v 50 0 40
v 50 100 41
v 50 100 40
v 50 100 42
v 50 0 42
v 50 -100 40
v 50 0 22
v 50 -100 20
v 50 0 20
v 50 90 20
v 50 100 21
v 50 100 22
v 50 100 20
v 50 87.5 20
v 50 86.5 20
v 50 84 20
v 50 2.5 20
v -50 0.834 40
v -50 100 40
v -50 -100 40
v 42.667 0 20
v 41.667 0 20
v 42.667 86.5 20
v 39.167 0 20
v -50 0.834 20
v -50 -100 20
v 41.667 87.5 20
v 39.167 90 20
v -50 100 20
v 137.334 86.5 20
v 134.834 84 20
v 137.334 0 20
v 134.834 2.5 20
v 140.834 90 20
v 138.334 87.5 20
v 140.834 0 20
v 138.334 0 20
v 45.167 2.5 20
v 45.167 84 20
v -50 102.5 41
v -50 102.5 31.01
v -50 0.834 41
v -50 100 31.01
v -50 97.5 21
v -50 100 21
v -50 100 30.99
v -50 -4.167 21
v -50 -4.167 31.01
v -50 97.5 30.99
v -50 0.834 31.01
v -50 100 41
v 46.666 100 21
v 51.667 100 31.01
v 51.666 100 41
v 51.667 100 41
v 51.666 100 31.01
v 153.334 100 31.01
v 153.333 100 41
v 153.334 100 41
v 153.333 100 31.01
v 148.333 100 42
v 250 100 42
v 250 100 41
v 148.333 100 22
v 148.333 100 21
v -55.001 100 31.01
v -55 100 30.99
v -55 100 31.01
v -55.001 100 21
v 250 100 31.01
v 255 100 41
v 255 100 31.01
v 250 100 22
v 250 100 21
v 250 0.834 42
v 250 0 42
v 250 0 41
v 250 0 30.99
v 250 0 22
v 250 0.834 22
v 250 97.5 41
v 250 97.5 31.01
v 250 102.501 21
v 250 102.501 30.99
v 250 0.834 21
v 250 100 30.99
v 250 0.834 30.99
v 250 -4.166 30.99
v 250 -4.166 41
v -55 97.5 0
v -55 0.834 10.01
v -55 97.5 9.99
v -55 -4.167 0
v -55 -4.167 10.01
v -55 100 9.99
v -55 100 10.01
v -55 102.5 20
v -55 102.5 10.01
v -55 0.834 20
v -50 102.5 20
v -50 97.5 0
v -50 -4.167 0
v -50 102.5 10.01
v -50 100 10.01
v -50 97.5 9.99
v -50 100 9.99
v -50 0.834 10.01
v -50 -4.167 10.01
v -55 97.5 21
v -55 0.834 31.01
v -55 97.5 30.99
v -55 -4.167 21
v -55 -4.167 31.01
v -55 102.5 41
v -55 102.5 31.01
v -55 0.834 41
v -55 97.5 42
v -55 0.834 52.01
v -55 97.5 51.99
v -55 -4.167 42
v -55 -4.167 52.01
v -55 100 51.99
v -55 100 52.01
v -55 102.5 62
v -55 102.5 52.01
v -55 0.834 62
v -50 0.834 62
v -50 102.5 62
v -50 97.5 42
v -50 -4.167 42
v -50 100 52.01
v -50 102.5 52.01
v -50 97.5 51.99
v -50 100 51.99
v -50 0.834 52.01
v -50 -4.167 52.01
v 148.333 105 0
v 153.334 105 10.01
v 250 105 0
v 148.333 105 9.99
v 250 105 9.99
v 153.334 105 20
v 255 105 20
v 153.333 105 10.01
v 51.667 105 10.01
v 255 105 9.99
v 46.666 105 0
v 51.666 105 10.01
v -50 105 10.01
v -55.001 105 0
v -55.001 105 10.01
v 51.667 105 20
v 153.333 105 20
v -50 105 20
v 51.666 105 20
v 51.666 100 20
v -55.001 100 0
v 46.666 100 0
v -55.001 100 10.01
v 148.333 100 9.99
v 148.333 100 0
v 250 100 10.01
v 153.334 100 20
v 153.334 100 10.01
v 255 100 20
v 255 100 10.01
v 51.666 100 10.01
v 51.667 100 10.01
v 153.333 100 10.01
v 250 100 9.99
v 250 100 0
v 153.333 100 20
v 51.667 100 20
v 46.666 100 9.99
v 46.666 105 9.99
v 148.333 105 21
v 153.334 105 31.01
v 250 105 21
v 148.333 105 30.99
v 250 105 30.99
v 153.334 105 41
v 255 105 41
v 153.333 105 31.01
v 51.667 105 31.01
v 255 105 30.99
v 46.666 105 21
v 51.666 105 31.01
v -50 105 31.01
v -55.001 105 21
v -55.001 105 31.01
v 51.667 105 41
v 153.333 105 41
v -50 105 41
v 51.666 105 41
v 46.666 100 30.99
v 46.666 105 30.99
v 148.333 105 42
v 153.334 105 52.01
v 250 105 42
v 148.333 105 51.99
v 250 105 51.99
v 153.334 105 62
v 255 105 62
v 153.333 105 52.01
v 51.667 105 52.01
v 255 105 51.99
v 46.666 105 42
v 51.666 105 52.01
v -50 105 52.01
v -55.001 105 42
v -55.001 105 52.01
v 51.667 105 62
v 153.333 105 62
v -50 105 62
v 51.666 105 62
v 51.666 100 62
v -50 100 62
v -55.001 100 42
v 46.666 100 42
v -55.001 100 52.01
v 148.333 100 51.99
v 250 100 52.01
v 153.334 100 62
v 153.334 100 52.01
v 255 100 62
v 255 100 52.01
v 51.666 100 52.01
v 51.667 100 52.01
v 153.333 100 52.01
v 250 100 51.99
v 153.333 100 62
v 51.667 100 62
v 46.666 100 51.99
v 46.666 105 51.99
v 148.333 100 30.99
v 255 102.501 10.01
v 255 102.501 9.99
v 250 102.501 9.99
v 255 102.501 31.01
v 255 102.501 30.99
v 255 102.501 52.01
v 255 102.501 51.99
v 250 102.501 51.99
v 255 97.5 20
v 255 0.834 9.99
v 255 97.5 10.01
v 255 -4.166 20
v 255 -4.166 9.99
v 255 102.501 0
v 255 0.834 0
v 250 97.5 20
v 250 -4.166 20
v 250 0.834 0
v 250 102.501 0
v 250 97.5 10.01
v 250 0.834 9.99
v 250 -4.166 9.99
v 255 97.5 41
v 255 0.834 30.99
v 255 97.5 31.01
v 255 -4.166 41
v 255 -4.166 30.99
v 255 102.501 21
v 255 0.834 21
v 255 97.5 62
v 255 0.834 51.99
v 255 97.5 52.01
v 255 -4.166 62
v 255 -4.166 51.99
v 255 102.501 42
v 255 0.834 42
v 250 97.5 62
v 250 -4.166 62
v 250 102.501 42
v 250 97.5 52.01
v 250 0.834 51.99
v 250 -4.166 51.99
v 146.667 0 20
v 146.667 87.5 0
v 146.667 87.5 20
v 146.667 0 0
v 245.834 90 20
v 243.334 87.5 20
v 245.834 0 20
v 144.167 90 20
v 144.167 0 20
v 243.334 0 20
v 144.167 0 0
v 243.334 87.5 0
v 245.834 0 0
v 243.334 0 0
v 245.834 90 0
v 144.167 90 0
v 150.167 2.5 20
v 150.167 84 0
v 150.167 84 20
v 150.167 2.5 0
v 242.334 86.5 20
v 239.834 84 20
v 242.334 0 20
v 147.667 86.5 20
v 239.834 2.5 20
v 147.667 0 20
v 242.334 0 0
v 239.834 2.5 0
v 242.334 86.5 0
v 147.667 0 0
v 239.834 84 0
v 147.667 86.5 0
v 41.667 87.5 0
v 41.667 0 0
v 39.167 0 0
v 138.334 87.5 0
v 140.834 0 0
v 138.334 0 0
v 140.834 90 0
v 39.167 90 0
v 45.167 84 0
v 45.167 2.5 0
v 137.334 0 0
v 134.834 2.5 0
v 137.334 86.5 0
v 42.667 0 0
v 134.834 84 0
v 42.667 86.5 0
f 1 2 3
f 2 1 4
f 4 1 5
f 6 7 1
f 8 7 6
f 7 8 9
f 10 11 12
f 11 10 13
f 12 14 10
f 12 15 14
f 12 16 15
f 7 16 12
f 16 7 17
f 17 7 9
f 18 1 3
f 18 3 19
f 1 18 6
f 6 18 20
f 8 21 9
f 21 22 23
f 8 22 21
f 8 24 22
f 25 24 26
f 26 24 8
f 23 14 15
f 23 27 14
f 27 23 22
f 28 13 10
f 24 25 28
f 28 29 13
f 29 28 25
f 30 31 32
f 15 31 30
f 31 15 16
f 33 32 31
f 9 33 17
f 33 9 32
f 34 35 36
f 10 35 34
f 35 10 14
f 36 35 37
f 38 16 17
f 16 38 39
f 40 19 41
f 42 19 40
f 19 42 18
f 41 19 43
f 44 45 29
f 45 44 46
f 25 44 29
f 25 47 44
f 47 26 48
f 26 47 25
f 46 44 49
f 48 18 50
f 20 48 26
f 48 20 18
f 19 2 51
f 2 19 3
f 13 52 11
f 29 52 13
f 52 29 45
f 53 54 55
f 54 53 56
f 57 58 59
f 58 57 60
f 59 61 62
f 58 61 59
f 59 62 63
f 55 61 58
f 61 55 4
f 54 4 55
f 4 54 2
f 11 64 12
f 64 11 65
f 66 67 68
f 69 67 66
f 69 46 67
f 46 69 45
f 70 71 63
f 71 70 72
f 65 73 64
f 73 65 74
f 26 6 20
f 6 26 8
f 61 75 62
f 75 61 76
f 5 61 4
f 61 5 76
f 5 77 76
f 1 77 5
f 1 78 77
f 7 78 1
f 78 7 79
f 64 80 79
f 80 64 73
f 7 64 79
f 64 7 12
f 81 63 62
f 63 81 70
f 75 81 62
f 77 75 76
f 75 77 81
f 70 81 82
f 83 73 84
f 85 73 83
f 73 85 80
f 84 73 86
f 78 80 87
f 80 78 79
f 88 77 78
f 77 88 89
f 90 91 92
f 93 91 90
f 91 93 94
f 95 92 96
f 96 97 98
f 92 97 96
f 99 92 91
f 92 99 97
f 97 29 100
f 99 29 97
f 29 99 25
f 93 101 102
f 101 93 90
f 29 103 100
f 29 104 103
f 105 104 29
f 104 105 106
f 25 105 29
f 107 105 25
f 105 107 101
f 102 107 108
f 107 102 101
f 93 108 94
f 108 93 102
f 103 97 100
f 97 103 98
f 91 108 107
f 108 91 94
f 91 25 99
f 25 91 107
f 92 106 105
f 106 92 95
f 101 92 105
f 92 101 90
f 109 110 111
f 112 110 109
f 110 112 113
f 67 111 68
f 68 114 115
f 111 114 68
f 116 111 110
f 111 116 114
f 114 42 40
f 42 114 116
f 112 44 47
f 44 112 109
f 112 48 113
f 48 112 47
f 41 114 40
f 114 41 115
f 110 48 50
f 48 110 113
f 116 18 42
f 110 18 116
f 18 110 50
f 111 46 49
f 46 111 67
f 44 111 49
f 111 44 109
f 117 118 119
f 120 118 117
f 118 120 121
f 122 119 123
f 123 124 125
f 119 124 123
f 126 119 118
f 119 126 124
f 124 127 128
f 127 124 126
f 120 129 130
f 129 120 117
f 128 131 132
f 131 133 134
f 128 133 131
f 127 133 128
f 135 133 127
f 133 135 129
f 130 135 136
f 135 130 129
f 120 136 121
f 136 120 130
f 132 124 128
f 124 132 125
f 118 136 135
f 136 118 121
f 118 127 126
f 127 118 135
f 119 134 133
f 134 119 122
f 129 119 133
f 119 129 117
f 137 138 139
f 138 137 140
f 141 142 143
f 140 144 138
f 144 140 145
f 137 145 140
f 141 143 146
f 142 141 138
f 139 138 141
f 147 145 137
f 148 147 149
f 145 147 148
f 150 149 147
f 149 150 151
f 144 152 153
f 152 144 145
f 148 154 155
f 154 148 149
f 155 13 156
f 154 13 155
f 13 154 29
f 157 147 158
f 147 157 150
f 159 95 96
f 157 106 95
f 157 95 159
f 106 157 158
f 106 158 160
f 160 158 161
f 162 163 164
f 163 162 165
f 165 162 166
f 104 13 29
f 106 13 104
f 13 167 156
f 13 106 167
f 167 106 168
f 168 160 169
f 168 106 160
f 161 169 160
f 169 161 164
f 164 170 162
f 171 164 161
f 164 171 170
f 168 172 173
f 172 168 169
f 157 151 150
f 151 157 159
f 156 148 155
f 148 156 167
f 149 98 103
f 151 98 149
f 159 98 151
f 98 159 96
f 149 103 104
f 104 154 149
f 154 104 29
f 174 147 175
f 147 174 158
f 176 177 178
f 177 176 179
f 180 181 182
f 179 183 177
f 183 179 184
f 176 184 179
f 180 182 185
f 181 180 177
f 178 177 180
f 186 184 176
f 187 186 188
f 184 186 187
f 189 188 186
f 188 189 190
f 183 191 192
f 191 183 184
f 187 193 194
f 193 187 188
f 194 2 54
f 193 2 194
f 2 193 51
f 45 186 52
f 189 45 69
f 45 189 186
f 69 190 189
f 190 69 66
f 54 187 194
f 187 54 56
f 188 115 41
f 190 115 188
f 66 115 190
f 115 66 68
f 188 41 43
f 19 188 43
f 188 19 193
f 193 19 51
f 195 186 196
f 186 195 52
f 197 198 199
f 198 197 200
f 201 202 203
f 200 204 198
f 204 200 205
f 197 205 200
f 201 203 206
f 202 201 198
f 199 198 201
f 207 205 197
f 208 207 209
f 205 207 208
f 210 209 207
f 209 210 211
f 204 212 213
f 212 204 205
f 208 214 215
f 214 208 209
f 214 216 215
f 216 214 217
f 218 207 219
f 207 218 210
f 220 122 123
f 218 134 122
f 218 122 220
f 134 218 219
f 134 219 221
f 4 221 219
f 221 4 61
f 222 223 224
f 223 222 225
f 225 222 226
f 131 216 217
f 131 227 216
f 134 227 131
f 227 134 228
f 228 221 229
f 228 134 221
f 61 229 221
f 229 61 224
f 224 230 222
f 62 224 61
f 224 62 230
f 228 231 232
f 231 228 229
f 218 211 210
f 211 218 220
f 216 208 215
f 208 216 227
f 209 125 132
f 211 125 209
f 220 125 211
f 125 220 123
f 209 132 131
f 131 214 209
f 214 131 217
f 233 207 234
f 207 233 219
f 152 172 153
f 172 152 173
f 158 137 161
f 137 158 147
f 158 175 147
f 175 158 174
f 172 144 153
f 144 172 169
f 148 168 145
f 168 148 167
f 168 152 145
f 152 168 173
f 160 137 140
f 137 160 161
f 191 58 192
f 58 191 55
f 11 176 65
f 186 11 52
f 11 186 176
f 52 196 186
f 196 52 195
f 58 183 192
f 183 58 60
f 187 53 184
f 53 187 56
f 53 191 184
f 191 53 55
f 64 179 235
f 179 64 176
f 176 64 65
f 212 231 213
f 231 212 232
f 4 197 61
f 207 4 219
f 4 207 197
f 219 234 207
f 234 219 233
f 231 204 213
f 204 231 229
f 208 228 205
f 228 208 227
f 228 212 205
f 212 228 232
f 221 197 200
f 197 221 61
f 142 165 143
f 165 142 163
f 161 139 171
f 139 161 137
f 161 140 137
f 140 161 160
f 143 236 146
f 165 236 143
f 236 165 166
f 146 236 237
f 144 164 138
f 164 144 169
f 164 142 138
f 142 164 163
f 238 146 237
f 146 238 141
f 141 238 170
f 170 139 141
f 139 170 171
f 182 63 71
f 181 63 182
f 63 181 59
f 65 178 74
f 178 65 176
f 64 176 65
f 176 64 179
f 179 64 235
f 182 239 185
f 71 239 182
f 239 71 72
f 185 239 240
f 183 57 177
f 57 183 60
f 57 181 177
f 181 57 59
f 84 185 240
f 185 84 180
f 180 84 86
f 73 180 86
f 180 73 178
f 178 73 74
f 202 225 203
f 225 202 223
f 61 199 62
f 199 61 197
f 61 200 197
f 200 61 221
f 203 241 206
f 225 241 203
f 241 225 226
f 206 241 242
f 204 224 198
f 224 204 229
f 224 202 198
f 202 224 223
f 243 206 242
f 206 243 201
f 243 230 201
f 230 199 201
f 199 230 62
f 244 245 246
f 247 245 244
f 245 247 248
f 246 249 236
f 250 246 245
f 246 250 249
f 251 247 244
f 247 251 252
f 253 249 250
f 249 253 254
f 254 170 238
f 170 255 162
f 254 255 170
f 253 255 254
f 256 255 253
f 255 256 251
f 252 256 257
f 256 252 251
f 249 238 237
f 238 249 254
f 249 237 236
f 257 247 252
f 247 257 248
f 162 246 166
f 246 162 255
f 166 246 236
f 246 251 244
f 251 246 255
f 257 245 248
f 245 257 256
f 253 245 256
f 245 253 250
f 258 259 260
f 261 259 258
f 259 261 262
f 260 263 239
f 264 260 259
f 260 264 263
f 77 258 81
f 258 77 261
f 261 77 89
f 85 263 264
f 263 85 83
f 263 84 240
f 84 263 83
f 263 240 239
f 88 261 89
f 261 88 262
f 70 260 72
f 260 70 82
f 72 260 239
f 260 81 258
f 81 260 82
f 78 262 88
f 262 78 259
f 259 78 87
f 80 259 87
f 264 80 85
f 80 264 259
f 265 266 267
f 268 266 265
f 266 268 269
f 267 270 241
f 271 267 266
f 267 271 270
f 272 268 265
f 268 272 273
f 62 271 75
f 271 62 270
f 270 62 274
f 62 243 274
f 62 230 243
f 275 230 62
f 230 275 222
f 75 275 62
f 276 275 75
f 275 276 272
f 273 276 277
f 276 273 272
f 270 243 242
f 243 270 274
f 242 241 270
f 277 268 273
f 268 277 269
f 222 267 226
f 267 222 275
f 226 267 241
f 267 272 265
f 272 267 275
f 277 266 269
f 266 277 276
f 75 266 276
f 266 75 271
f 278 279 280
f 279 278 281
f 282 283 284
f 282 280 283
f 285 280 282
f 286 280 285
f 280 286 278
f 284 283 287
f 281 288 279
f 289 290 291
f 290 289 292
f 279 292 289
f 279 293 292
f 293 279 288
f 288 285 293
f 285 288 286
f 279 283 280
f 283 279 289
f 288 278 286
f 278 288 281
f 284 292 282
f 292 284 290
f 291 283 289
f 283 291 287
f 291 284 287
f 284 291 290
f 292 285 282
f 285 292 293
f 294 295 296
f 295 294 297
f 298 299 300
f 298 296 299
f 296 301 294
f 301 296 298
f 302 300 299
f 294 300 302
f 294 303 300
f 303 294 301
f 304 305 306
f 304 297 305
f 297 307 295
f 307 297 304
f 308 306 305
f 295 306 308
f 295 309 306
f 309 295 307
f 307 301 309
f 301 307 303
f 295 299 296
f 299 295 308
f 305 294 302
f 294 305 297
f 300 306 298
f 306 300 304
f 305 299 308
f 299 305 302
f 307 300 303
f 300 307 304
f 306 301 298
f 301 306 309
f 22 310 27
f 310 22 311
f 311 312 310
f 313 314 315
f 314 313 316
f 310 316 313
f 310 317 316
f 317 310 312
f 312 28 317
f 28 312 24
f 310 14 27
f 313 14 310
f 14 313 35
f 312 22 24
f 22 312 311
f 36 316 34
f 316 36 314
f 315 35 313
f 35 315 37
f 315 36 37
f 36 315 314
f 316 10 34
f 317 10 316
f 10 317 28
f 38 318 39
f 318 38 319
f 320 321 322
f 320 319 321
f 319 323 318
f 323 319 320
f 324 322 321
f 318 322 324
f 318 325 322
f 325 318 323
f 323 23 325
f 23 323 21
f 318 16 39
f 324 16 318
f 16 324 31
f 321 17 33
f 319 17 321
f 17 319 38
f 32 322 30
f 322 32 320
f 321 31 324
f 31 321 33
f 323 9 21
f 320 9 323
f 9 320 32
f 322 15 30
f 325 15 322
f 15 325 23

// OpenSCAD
$fn=64;
union(){translate(v = [0, 0, 20])
union(){color("Grey"){translate(v = [-50.000, -100.000])
cube(size = [100, 200, 20]);
}
translate(v = [150.000, 50.000, 2])
rotate(a = [0, 0, 90])
color("BLUE"){translate(v = [-50.000, -100.000])
cube(size = [100, 200, 20]);
}
}
translate(v = [-52.500, 49.167])
rotate(a = [0, 0, 180])
union(){difference(){translate(v = [-2.500, -53.333])
cube(size = [5, 106.667, 20]);
translate(v = [-0.100, 50.933, 10.010])
translate(v = [-2.600, -2.600])
cube(size = [5.200, 5.200, 10.000]);
translate(v = [-0.100, -50.933, -0.010])
translate(v = [-2.600, -2.600])
cube(size = [5.200, 5.200, 10.000]);
}
translate(v = [0, 0, 21])
difference(){translate(v = [-2.500, -53.333])
cube(size = [5, 106.667, 20]);
translate(v = [-0.100, 50.933, 10.010])
translate(v = [-2.600, -2.600])
cube(size = [5.200, 5.200, 10.000]);
translate(v = [-0.100, -50.933, -0.010])
translate(v = [-2.600, -2.600])
cube(size = [5.200, 5.200, 10.000]);
}
translate(v = [0, 0, 42])
difference(){translate(v = [-2.500, -53.333])
cube(size = [5, 106.667, 20]);
translate(v = [-0.100, 50.933, 10.010])
translate(v = [-2.600, -2.600])
cube(size = [5.200, 5.200, 10.000]);
translate(v = [-0.100, -50.933, -0.010])
translate(v = [-2.600, -2.600])
cube(size = [5.200, 5.200, 10.000]);
}
}
translate(v = [-1.667, 102.500])
rotate(a = [0, 0, 90])
union(){difference(){translate(v = [-2.500, -53.333])
cube(size = [5, 106.667, 20]);
translate(v = [-0.100, 50.933, 10.010])
translate(v = [-2.600, -2.600])
cube(size = [5.200, 5.200, 10.000]);
translate(v = [-0.100, -50.933, -0.010])
translate(v = [-2.600, -2.600])
cube(size = [5.200, 5.200, 10.000]);
}
translate(v = [0, 0, 21])
difference(){translate(v = [-2.500, -53.333])
cube(size = [5, 106.667, 20]);
translate(v = [-0.100, 50.933, 10.010])
translate(v = [-2.600, -2.600])
cube(size = [5.200, 5.200, 10.000]);
translate(v = [-0.100, -50.933, -0.010])
translate(v = [-2.600, -2.600])
cube(size = [5.200, 5.200, 10.000]);
}
translate(v = [0, 0, 42])
difference(){translate(v = [-2.500, -53.333])
cube(size = [5, 106.667, 20]);
translate(v = [-0.100, 50.933, 10.010])
translate(v = [-2.600, -2.600])
cube(size = [5.200, 5.200, 10.000]);
translate(v = [-0.100, -50.933, -0.010])
translate(v = [-2.600, -2.600])
cube(size = [5.200, 5.200, 10.000]);
}
}
translate(v = [100.000, 102.500])
rotate(a = [0, 0, 90])
union(){difference(){translate(v = [-2.500, -53.333])
cube(size = [5, 106.667, 20]);
translate(v = [-0.100, 50.933, 10.010])
translate(v = [-2.600, -2.600])
cube(size = [5.200, 5.200, 10.000]);
translate(v = [-0.100, -50.933, -0.010])
translate(v = [-2.600, -2.600])
cube(size = [5.200, 5.200, 10.000]);
}
translate(v = [0, 0, 21])
difference(){translate(v = [-2.500, -53.333])
cube(size = [5, 106.667, 20]);
translate(v = [-0.100, 50.933, 10.010])
translate(v = [-2.600, -2.600])
cube(size = [5.200, 5.200, 10.000]);
translate(v = [-0.100, -50.933, -0.010])
translate(v = [-2.600, -2.600])
cube(size = [5.200, 5.200, 10.000]);
}
translate(v = [0, 0, 42])
difference(){translate(v = [-2.500, -53.333])
cube(size = [5, 106.667, 20]);
translate(v = [-0.100, 50.933, 10.010])
translate(v = [-2.600, -2.600])
cube(size = [5.200, 5.200, 10.000]);
translate(v = [-0.100, -50.933, -0.010])
translate(v = [-2.600, -2.600])
cube(size = [5.200, 5.200, 10.000]);
}
}
translate(v = [201.667, 102.500])
rotate(a = [0, 0, 90])
union(){difference(){translate(v = [-2.500, -53.333])
cube(size = [5, 106.667, 20]);
translate(v = [-0.100, 50.933, 10.010])
translate(v = [-2.600, -2.600])
cube(size = [5.200, 5.200, 10.000]);
translate(v = [-0.100, -50.933, -0.010])
translate(v = [-2.600, -2.600])
cube(size = [5.200, 5.200, 10.000]);
}
translate(v = [0, 0, 21])
difference(){translate(v = [-2.500, -53.333])
cube(size = [5, 106.667, 20]);
translate(v = [-0.100, 50.933, 10.010])
translate(v = [-2.600, -2.600])
cube(size = [5.200, 5.200, 10.000]);
translate(v = [-0.100, -50.933, -0.010])
translate(v = [-2.600, -2.600])
cube(size = [5.200, 5.200, 10.000]);
}
translate(v = [0, 0, 42])
difference(){translate(v = [-2.500, -53.333])
cube(size = [5, 106.667, 20]);
translate(v = [-0.100, 50.933, 10.010])
translate(v = [-2.600, -2.600])
cube(size = [5.200, 5.200, 10.000]);
translate(v = [-0.100, -50.933, -0.010])
translate(v = [-2.600, -2.600])
cube(size = [5.200, 5.200, 10.000]);
}
}
translate(v = [252.500, 49.167])
union(){difference(){translate(v = [-2.500, -53.333])
cube(size = [5, 106.667, 20]);
translate(v = [-0.100, 50.933, 10.010])
translate(v = [-2.600, -2.600])
cube(size = [5.200, 5.200, 10.000]);
translate(v = [-0.100, -50.933, -0.010])
translate(v = [-2.600, -2.600])
cube(size = [5.200, 5.200, 10.000]);
}
translate(v = [0, 0, 21])
difference(){translate(v = [-2.500, -53.333])
cube(size = [5, 106.667, 20]);
translate(v = [-0.100, 50.933, 10.010])
translate(v = [-2.600, -2.600])
cube(size = [5.200, 5.200, 10.000]);
translate(v = [-0.100, -50.933, -0.010])
translate(v = [-2.600, -2.600])
cube(size = [5.200, 5.200, 10.000]);
}
translate(v = [0, 0, 42])
difference(){translate(v = [-2.500, -53.333])
cube(size = [5, 106.667, 20]);
translate(v = [-0.100, 50.933, 10.010])
translate(v = [-2.600, -2.600])
cube(size = [5.200, 5.200, 10.000]);
translate(v = [-0.100, -50.933, -0.010])
translate(v = [-2.600, -2.600])
cube(size = [5.200, 5.200, 10.000]);
}
}
translate(v = [195, 45])
translate(v = [-50.833, -45.000])
union(){cube(size = [2.500, 87.500, 20]);
translate(v = [99.167, 0])
cube(size = [2.500, 87.500, 20]);
translate(v = [0, 87.500])
cube(size = [101.667, 2.500, 20]);
translate(v = [3.500, 2.500])
cube(size = [2.500, 81.500, 20]);
translate(v = [95.667, 2.500])
cube(size = [2.500, 81.500, 20]);
translate(v = [3.500, 0])
cube(size = [94.667, 2.500, 20]);
translate(v = [3.500, 84.000])
cube(size = [94.667, 2.500, 20]);
}
translate(v = [90, 45])
translate(v = [-50.833, -45.000])
union(){cube(size = [2.500, 87.500, 20]);
translate(v = [99.167, 0])
cube(size = [2.500, 87.500, 20]);
translate(v = [0, 87.500])
cube(size = [101.667, 2.500, 20]);
translate(v = [3.500, 2.500])
cube(size = [2.500, 81.500, 20]);
translate(v = [95.667, 2.500])
cube(size = [2.500, 81.500, 20]);
translate(v = [3.500, 0])
cube(size = [94.667, 2.500, 20]);
translate(v = [3.500, 84.000])
cube(size = [94.667, 2.500, 20]);
}
}
